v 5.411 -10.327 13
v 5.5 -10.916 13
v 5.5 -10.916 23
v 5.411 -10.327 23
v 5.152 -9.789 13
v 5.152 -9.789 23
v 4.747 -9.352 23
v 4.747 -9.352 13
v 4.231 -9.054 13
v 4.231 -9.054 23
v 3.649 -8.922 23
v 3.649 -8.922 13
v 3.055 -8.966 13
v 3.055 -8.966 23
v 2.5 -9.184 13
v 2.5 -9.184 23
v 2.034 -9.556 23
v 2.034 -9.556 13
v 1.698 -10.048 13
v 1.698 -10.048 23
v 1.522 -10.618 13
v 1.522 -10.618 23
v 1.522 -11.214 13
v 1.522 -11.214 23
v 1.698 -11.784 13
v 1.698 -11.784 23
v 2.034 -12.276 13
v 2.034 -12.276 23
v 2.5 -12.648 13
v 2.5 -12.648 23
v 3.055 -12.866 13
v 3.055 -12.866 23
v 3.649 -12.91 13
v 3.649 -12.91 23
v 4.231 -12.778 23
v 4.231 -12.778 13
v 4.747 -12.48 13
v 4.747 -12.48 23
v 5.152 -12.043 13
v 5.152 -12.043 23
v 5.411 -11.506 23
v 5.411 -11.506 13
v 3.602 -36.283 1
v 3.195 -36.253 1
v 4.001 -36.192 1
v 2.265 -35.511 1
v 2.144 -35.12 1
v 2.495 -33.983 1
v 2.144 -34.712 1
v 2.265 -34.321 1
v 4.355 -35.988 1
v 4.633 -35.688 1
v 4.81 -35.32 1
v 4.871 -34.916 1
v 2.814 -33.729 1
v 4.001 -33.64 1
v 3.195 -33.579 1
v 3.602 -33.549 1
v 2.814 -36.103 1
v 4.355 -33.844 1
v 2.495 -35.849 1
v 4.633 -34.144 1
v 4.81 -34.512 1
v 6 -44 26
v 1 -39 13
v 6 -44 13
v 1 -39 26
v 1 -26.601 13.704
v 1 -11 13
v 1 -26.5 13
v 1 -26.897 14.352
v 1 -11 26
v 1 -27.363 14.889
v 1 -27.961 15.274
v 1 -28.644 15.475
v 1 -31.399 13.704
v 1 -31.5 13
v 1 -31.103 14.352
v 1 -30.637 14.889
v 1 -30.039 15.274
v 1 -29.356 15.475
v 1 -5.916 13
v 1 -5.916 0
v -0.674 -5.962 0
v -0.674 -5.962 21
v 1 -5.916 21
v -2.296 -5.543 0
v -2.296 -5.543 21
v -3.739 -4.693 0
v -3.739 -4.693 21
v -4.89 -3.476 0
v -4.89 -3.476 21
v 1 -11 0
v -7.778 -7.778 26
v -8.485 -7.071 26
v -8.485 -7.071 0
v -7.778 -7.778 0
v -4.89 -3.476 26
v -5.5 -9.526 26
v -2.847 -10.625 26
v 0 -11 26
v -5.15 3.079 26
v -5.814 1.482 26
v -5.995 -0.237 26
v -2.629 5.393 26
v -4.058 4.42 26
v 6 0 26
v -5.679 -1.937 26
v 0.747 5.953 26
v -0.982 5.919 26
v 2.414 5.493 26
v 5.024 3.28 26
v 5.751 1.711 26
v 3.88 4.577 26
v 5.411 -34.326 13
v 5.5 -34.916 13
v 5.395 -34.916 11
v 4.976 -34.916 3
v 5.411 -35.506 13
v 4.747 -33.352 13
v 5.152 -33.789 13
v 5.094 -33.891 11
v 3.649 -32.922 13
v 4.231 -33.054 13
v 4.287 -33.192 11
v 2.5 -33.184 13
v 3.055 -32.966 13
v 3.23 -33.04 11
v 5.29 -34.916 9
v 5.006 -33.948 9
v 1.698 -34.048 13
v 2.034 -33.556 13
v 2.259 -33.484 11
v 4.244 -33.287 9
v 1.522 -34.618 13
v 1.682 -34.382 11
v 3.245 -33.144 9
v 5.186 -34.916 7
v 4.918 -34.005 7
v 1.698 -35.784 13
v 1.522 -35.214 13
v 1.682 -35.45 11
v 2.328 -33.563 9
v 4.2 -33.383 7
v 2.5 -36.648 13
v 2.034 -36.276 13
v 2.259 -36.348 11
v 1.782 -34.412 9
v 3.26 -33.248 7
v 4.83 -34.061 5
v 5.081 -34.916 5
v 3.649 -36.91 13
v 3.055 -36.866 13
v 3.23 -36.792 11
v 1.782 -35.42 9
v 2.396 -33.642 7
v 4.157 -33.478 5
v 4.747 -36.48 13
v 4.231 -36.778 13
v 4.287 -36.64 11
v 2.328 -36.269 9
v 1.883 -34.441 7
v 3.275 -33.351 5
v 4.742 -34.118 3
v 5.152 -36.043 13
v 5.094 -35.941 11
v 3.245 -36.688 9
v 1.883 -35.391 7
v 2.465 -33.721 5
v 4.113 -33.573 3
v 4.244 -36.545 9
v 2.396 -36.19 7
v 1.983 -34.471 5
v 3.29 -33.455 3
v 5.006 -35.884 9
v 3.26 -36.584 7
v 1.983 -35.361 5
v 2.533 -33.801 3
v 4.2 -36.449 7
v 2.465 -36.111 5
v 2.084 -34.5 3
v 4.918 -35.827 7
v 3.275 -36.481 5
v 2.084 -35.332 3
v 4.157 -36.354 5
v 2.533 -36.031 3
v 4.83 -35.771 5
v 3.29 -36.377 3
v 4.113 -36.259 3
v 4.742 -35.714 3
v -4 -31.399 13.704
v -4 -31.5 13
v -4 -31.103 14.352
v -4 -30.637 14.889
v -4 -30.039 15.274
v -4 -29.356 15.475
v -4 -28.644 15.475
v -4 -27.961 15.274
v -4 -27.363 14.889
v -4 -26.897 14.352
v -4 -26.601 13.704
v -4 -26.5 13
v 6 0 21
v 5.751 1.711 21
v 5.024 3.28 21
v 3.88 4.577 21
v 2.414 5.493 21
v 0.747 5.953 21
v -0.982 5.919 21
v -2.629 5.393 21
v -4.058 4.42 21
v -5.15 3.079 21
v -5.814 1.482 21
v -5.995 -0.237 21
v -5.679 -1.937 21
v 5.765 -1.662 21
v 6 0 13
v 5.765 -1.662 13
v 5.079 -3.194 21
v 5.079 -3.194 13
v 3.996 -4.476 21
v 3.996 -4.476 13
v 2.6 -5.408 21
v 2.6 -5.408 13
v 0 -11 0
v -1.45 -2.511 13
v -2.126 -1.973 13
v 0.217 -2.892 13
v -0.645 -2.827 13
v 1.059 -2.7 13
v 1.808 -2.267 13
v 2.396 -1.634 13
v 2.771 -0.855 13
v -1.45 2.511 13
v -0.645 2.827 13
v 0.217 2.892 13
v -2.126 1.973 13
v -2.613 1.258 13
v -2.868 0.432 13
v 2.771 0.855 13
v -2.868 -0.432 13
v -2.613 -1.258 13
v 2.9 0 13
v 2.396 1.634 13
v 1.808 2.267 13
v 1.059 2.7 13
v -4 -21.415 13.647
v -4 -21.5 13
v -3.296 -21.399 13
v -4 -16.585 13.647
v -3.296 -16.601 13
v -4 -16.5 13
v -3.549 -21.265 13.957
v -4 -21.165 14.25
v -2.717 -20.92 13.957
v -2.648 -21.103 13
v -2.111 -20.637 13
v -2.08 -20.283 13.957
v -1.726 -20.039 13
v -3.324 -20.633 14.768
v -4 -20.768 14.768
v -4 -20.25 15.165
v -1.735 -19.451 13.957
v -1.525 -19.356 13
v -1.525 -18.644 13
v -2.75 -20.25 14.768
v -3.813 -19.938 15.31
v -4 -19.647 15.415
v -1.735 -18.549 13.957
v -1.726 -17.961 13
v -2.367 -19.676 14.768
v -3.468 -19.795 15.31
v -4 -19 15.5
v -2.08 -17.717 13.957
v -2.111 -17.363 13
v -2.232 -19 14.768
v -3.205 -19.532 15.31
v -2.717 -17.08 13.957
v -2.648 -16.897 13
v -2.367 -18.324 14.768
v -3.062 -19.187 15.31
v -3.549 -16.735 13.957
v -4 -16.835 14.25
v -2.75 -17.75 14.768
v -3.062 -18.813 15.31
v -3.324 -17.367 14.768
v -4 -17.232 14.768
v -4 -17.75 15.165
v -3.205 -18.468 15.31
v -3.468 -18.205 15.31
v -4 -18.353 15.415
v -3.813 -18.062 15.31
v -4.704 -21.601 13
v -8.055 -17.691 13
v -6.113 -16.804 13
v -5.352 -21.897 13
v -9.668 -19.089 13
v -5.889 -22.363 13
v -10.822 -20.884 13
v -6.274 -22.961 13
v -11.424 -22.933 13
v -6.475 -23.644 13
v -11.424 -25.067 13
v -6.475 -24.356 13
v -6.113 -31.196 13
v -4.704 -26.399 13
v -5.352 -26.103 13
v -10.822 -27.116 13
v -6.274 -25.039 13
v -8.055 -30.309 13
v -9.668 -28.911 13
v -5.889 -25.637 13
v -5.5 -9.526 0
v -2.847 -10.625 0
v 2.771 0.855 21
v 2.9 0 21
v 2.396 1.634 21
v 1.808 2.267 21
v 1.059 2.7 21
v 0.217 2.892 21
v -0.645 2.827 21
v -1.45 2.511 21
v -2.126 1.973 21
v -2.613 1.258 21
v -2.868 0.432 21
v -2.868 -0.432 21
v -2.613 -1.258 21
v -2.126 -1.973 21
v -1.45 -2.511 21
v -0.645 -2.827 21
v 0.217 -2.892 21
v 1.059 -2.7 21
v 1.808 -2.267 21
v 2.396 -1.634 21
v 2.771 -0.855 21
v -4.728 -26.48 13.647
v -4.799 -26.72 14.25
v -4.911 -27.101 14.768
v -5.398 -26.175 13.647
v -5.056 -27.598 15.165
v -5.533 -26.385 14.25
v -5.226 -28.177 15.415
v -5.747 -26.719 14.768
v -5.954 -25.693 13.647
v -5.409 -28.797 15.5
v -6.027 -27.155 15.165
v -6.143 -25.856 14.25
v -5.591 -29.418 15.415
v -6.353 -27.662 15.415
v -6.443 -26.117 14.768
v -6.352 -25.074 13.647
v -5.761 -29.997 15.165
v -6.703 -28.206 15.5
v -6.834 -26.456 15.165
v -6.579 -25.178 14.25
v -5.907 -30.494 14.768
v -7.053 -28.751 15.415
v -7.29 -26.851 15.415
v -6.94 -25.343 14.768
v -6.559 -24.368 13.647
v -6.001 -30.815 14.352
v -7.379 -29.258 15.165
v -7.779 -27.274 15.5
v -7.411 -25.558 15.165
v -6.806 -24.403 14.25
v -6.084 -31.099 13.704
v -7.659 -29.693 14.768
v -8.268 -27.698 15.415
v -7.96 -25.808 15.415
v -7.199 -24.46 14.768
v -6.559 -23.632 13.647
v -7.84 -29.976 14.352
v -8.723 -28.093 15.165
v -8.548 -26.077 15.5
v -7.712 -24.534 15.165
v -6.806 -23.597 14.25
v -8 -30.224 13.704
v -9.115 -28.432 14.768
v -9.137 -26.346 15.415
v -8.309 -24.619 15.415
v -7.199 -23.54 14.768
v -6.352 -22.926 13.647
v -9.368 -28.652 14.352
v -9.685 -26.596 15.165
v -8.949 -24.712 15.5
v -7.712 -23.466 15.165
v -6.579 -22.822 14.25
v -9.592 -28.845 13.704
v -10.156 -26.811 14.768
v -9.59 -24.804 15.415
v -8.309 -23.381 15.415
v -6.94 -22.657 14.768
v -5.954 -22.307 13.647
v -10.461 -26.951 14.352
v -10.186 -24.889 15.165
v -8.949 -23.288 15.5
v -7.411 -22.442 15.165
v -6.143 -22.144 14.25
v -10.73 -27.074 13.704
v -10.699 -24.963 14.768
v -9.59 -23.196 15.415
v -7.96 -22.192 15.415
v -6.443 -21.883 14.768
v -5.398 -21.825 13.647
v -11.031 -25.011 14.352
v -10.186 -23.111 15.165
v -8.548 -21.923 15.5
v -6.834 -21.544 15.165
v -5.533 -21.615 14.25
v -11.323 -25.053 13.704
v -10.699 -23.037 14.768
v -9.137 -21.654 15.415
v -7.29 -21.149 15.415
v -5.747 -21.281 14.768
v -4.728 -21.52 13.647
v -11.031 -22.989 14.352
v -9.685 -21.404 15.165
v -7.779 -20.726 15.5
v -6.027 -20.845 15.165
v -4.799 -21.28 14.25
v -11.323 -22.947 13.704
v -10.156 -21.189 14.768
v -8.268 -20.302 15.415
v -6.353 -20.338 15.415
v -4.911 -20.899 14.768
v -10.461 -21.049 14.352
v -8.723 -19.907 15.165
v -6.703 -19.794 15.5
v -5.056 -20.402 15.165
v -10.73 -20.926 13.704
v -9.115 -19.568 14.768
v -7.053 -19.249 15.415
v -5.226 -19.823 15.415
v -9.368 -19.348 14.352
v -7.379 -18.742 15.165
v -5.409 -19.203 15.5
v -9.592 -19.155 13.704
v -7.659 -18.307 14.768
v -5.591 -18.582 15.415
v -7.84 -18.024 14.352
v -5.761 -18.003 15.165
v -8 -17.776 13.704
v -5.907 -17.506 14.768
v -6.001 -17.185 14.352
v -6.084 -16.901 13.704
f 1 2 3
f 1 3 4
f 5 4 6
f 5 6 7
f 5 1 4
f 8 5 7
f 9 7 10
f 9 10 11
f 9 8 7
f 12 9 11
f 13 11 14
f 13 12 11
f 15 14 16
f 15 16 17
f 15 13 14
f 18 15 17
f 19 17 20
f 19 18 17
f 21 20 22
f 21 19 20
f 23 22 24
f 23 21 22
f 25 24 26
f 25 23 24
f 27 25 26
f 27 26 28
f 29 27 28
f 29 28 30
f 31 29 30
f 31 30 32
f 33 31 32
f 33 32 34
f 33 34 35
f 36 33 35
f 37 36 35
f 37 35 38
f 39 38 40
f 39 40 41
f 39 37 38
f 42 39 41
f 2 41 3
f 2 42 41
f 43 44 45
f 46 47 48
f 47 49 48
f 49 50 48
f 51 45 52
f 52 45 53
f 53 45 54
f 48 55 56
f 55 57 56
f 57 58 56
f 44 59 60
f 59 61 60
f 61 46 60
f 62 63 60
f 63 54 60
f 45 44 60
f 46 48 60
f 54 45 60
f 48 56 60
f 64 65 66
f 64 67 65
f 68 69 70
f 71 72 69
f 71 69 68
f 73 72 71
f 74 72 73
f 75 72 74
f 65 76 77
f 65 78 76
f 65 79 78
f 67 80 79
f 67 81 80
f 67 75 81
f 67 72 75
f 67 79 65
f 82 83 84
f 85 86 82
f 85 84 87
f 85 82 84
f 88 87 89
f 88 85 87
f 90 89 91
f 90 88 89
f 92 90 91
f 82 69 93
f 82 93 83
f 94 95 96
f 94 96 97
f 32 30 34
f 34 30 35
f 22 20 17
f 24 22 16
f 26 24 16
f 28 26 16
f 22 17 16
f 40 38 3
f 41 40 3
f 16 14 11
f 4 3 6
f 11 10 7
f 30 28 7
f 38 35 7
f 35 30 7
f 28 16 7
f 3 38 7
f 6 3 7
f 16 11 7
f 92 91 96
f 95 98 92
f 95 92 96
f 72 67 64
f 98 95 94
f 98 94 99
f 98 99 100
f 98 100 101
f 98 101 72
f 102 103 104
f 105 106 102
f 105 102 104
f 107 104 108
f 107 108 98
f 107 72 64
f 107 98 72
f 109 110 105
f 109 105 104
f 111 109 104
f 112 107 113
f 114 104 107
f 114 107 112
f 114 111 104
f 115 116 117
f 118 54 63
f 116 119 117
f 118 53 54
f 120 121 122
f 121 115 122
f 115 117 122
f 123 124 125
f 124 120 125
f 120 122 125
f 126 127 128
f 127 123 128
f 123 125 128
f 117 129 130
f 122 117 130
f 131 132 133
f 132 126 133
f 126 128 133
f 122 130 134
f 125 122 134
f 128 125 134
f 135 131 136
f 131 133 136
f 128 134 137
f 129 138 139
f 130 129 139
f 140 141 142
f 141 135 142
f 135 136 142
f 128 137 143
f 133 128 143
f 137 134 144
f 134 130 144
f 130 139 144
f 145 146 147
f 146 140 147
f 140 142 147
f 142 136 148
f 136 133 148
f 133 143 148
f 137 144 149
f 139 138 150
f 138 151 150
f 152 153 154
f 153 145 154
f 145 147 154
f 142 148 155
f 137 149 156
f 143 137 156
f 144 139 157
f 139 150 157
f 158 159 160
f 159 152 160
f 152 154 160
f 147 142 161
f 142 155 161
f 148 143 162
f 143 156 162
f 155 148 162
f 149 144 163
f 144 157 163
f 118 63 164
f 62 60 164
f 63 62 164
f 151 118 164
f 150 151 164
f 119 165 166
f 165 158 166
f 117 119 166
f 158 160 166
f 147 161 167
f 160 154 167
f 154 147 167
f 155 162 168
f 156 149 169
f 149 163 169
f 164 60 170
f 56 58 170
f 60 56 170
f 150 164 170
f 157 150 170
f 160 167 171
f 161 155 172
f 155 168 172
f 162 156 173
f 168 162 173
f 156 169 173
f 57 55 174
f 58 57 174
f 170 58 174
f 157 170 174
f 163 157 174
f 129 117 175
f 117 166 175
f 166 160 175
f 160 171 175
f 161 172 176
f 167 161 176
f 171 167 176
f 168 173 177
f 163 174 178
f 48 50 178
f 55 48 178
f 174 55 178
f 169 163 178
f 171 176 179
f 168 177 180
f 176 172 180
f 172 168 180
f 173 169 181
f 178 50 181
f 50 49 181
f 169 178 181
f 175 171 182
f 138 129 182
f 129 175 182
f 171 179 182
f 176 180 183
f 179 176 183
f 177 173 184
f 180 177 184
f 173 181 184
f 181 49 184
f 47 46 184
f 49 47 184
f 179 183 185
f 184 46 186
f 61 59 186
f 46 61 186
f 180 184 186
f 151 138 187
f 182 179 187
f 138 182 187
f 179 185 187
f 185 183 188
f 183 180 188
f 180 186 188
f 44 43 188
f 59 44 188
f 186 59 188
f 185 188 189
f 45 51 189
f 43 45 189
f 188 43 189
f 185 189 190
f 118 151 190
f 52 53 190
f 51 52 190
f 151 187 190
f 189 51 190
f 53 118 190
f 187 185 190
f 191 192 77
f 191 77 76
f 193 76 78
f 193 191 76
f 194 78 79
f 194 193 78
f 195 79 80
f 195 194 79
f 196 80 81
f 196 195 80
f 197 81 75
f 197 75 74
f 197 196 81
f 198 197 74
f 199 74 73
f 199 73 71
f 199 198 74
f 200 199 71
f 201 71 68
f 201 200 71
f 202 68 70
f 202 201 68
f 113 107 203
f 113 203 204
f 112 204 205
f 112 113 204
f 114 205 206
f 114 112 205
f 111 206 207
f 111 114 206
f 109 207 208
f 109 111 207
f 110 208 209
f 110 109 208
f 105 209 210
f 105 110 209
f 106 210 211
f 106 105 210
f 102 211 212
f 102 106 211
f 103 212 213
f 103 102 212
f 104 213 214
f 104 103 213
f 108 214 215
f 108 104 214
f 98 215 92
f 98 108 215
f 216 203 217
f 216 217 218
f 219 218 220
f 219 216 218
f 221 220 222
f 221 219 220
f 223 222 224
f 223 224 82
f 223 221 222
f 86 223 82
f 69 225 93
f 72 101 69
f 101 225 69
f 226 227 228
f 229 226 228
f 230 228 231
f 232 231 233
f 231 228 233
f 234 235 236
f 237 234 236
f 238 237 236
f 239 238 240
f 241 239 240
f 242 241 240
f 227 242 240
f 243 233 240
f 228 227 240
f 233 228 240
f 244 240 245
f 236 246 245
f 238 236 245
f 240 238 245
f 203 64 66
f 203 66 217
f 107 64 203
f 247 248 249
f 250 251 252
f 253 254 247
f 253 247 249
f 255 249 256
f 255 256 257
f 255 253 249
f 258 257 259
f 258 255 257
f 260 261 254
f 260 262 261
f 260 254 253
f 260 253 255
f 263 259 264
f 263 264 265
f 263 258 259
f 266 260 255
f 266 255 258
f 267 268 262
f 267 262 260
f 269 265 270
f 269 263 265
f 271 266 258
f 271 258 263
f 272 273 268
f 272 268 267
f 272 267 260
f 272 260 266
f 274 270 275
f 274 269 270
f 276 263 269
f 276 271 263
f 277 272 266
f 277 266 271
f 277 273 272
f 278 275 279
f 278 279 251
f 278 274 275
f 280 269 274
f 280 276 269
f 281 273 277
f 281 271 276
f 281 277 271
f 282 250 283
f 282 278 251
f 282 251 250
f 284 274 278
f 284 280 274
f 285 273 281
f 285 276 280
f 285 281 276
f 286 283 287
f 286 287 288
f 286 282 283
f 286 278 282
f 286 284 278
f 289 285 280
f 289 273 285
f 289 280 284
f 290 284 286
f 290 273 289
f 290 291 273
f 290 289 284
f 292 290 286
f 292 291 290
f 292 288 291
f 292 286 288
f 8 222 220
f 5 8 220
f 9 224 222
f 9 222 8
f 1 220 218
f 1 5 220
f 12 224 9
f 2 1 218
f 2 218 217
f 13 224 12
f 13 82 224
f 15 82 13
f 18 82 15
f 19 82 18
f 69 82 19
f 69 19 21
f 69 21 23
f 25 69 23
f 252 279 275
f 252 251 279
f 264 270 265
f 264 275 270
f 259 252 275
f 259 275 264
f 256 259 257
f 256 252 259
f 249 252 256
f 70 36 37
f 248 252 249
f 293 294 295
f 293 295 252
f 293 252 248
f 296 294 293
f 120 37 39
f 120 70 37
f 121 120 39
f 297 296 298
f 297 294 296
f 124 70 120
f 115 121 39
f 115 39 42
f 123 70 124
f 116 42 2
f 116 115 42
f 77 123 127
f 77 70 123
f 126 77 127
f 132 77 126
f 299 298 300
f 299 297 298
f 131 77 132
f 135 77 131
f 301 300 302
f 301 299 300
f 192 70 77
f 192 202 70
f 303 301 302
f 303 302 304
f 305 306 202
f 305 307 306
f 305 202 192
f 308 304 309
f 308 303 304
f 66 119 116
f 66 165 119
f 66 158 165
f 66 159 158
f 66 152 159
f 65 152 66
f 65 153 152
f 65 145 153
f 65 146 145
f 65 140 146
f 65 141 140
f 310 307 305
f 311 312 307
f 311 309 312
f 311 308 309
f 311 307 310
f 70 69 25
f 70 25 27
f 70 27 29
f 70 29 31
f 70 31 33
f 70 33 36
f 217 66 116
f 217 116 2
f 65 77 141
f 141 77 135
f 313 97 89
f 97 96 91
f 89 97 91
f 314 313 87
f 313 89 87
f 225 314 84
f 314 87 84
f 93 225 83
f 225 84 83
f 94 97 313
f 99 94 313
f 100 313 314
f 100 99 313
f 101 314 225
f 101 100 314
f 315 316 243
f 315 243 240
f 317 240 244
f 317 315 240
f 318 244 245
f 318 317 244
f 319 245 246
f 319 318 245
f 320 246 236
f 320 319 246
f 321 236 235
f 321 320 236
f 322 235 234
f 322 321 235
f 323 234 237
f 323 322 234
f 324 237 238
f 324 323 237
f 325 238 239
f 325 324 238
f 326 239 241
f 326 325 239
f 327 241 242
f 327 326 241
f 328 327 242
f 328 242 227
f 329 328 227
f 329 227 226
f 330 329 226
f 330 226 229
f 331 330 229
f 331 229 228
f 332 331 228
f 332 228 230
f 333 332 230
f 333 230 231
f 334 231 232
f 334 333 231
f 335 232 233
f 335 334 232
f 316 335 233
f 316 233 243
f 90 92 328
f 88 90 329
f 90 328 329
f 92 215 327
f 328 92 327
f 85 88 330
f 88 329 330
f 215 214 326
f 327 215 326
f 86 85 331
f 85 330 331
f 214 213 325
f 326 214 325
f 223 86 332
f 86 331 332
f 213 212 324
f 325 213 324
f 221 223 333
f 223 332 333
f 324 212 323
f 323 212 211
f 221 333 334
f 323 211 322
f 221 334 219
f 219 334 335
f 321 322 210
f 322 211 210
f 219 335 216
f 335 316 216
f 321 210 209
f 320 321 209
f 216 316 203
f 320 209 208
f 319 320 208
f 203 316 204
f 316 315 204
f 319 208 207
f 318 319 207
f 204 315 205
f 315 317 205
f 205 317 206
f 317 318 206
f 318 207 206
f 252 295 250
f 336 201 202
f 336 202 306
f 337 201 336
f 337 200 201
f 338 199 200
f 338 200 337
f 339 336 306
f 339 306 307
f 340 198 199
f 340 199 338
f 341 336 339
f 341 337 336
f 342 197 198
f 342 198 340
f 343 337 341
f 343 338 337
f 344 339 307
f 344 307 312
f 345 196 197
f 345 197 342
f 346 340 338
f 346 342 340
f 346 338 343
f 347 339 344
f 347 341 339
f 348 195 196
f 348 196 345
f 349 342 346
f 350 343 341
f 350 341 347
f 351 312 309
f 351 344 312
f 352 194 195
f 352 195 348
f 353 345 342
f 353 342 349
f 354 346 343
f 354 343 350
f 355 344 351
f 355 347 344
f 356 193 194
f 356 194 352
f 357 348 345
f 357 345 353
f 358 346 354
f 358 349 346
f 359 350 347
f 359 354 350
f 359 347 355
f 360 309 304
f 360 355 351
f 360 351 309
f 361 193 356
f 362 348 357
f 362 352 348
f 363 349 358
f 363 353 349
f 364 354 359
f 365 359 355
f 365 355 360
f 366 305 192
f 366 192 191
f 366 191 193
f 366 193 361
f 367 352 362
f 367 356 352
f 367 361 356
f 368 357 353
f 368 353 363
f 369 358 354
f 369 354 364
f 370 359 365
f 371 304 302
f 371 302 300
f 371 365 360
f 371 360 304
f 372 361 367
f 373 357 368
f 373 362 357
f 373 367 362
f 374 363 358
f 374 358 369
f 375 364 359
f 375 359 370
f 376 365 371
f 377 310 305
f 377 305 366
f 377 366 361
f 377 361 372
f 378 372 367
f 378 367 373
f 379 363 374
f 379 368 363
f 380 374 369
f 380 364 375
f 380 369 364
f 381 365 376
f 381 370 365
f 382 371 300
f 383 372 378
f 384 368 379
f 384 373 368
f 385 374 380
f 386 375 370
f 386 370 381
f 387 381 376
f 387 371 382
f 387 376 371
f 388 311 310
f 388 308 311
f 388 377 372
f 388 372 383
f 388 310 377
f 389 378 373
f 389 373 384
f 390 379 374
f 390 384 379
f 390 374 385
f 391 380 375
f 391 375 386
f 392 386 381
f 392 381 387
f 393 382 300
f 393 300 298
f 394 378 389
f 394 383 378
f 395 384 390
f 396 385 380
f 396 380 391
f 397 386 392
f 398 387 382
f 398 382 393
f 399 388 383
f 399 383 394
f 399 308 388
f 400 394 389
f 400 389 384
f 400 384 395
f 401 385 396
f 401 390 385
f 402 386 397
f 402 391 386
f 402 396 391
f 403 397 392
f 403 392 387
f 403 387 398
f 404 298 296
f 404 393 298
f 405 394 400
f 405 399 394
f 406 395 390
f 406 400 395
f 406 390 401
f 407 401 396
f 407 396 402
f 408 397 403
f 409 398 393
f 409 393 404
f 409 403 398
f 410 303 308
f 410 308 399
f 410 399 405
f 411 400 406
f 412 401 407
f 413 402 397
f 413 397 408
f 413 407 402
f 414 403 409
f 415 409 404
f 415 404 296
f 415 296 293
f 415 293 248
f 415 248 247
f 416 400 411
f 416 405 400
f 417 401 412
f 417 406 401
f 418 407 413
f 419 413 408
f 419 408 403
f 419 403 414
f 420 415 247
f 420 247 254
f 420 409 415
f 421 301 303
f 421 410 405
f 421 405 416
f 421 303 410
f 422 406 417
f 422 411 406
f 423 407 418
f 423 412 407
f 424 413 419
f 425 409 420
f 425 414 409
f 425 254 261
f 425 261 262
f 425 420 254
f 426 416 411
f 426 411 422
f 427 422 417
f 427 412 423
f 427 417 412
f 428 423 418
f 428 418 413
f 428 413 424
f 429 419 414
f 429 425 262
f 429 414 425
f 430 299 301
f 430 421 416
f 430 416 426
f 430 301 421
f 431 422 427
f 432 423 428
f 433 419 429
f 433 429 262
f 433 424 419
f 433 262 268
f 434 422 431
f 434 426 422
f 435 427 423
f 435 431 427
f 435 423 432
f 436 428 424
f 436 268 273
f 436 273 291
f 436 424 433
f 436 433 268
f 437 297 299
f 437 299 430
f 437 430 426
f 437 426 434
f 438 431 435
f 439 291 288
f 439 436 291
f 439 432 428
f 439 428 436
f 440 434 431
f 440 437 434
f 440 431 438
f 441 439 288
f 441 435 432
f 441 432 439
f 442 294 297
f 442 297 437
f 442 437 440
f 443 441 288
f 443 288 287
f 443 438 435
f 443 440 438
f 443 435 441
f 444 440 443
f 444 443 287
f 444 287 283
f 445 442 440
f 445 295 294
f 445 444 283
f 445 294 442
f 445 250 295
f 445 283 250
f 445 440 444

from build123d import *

# Parameters (mm, degrees)
F1_DEPTH  = 5
F3_DEPTH  = 8
F4_R      = 2
F5_DEPTH  = 10
F6_R      = 2
F7_DEPTH  = 12
F7_TAPER  = 3
F8_R      = 2.9
F9_DEPTH  = 8
F18_DEPTH = 26


with BuildPart() as f1:
    # F0 (on Top) → F1 (new body)
    with BuildSketch(Plane.XY):
        with BuildLine():
            Line((6, -44), (6, 0))
            ThreePointArc((6, 0), (-4.582575695, 3.8729833462), (1, -5.9160797831))
            Line((1, -5.9160797831), (1, -39))
            Line((1, -39), (6, -44))
        make_face()
    extrude(amount=F1_DEPTH)

    # F2 (on face) → F3 (join)
    with BuildSketch(Plane.XY.offset(5)):
        with BuildLine():
            ThreePointArc((6, 0), (4.582575695, -3.8729833462), (1, -5.9160797831))
            Line((1, -5.9160797831), (1, -39))
            Line((1, -39), (6, -44))
            Line((6, -44), (6, 0))
        make_face()
    extrude(amount=F3_DEPTH)

    # F4 (on face) → F5 (cut)
    with BuildSketch(Plane.XY.offset(13)):
        with Locations((3.5, -10.9160797831)):
            Circle(F4_R)
    extrude(amount=-F5_DEPTH, mode=Mode.SUBTRACT)

    # F6 (on face) → F7 (join)
    with BuildSketch(Plane.XY.offset(13)):
        with Locations((3.5, -34.916)):
            Circle(F6_R)
    extrude(amount=F7_DEPTH, taper=F7_TAPER)

    # F8 (on face) → F9 (join, through all)
    with BuildSketch(Plane.XY.offset(5)):
        Circle(F8_R)
    extrude(amount=F9_DEPTH)


with BuildPart() as f10_1:
    # F10: instance of F1
    add(f1.part.mirror(Plane(origin=(3.6215352024, -22.9951774059, 13), x_dir=(1, 0, 0), z_dir=(0, 0, 1))))

    # F14: sweep along a path in F12
    with BuildLine(Plane(origin=(0, 0, 13), x_dir=(1, 0, 0), z_dir=(0, 0, -1))) as f14_path:
        Line((1, 29), (-4, 29))
        ThreePointArc((-4, 29), (-9, 24), (-4, 19))
    # F13 (on face) → F14 (sweep)
    with BuildSketch(Plane(origin=(1, 0, 0), x_dir=(0, -1, 0), z_dir=(-1, 0, 0))):
        with BuildLine():
            ThreePointArc((31.5, 13), (29, 15.5), (26.5, 13))
            Line((26.5, 13), (31.5, 13))
        make_face()
    sweep(path=f14_path.line)

    # F15 (on face) → F16 (revolve)
    with BuildSketch(Plane.YZ.offset(-4)):
        with BuildLine():
            Line((-19, 13), (-16.5, 13))
            ThreePointArc((-16.5, 13), (-17.232233047, 14.767766953), (-19, 15.5))
            Line((-19, 15.5), (-19, 13))
        make_face()
    revolve(axis=Axis((-4, -19, 14.25), (0, 0, 1)))

    # F17 (on face) → F18 (join)
    with BuildSketch(Plane.XY.offset(26)):
        with BuildLine():
            Line((-8.4852813742, -7.0710678119), (-7.7781745931, -7.7781745931))
            ThreePointArc((-7.7781745931, -7.7781745931), (-4.209517756, -10.1626748576), (0, -11))
            Line((0, -11), (1, -11))
            Line((1, -11), (1, -5.9160797831))
            ThreePointArc((1, -5.9160797831), (-2.2961005942, -5.5432771951), (-4.8904069139, -3.4761933515))
            Line((-4.8904069139, -3.4761933515), (-8.4852813742, -7.0710678119))
        make_face()
    extrude(amount=-F18_DEPTH)


solid = f10_1.part
